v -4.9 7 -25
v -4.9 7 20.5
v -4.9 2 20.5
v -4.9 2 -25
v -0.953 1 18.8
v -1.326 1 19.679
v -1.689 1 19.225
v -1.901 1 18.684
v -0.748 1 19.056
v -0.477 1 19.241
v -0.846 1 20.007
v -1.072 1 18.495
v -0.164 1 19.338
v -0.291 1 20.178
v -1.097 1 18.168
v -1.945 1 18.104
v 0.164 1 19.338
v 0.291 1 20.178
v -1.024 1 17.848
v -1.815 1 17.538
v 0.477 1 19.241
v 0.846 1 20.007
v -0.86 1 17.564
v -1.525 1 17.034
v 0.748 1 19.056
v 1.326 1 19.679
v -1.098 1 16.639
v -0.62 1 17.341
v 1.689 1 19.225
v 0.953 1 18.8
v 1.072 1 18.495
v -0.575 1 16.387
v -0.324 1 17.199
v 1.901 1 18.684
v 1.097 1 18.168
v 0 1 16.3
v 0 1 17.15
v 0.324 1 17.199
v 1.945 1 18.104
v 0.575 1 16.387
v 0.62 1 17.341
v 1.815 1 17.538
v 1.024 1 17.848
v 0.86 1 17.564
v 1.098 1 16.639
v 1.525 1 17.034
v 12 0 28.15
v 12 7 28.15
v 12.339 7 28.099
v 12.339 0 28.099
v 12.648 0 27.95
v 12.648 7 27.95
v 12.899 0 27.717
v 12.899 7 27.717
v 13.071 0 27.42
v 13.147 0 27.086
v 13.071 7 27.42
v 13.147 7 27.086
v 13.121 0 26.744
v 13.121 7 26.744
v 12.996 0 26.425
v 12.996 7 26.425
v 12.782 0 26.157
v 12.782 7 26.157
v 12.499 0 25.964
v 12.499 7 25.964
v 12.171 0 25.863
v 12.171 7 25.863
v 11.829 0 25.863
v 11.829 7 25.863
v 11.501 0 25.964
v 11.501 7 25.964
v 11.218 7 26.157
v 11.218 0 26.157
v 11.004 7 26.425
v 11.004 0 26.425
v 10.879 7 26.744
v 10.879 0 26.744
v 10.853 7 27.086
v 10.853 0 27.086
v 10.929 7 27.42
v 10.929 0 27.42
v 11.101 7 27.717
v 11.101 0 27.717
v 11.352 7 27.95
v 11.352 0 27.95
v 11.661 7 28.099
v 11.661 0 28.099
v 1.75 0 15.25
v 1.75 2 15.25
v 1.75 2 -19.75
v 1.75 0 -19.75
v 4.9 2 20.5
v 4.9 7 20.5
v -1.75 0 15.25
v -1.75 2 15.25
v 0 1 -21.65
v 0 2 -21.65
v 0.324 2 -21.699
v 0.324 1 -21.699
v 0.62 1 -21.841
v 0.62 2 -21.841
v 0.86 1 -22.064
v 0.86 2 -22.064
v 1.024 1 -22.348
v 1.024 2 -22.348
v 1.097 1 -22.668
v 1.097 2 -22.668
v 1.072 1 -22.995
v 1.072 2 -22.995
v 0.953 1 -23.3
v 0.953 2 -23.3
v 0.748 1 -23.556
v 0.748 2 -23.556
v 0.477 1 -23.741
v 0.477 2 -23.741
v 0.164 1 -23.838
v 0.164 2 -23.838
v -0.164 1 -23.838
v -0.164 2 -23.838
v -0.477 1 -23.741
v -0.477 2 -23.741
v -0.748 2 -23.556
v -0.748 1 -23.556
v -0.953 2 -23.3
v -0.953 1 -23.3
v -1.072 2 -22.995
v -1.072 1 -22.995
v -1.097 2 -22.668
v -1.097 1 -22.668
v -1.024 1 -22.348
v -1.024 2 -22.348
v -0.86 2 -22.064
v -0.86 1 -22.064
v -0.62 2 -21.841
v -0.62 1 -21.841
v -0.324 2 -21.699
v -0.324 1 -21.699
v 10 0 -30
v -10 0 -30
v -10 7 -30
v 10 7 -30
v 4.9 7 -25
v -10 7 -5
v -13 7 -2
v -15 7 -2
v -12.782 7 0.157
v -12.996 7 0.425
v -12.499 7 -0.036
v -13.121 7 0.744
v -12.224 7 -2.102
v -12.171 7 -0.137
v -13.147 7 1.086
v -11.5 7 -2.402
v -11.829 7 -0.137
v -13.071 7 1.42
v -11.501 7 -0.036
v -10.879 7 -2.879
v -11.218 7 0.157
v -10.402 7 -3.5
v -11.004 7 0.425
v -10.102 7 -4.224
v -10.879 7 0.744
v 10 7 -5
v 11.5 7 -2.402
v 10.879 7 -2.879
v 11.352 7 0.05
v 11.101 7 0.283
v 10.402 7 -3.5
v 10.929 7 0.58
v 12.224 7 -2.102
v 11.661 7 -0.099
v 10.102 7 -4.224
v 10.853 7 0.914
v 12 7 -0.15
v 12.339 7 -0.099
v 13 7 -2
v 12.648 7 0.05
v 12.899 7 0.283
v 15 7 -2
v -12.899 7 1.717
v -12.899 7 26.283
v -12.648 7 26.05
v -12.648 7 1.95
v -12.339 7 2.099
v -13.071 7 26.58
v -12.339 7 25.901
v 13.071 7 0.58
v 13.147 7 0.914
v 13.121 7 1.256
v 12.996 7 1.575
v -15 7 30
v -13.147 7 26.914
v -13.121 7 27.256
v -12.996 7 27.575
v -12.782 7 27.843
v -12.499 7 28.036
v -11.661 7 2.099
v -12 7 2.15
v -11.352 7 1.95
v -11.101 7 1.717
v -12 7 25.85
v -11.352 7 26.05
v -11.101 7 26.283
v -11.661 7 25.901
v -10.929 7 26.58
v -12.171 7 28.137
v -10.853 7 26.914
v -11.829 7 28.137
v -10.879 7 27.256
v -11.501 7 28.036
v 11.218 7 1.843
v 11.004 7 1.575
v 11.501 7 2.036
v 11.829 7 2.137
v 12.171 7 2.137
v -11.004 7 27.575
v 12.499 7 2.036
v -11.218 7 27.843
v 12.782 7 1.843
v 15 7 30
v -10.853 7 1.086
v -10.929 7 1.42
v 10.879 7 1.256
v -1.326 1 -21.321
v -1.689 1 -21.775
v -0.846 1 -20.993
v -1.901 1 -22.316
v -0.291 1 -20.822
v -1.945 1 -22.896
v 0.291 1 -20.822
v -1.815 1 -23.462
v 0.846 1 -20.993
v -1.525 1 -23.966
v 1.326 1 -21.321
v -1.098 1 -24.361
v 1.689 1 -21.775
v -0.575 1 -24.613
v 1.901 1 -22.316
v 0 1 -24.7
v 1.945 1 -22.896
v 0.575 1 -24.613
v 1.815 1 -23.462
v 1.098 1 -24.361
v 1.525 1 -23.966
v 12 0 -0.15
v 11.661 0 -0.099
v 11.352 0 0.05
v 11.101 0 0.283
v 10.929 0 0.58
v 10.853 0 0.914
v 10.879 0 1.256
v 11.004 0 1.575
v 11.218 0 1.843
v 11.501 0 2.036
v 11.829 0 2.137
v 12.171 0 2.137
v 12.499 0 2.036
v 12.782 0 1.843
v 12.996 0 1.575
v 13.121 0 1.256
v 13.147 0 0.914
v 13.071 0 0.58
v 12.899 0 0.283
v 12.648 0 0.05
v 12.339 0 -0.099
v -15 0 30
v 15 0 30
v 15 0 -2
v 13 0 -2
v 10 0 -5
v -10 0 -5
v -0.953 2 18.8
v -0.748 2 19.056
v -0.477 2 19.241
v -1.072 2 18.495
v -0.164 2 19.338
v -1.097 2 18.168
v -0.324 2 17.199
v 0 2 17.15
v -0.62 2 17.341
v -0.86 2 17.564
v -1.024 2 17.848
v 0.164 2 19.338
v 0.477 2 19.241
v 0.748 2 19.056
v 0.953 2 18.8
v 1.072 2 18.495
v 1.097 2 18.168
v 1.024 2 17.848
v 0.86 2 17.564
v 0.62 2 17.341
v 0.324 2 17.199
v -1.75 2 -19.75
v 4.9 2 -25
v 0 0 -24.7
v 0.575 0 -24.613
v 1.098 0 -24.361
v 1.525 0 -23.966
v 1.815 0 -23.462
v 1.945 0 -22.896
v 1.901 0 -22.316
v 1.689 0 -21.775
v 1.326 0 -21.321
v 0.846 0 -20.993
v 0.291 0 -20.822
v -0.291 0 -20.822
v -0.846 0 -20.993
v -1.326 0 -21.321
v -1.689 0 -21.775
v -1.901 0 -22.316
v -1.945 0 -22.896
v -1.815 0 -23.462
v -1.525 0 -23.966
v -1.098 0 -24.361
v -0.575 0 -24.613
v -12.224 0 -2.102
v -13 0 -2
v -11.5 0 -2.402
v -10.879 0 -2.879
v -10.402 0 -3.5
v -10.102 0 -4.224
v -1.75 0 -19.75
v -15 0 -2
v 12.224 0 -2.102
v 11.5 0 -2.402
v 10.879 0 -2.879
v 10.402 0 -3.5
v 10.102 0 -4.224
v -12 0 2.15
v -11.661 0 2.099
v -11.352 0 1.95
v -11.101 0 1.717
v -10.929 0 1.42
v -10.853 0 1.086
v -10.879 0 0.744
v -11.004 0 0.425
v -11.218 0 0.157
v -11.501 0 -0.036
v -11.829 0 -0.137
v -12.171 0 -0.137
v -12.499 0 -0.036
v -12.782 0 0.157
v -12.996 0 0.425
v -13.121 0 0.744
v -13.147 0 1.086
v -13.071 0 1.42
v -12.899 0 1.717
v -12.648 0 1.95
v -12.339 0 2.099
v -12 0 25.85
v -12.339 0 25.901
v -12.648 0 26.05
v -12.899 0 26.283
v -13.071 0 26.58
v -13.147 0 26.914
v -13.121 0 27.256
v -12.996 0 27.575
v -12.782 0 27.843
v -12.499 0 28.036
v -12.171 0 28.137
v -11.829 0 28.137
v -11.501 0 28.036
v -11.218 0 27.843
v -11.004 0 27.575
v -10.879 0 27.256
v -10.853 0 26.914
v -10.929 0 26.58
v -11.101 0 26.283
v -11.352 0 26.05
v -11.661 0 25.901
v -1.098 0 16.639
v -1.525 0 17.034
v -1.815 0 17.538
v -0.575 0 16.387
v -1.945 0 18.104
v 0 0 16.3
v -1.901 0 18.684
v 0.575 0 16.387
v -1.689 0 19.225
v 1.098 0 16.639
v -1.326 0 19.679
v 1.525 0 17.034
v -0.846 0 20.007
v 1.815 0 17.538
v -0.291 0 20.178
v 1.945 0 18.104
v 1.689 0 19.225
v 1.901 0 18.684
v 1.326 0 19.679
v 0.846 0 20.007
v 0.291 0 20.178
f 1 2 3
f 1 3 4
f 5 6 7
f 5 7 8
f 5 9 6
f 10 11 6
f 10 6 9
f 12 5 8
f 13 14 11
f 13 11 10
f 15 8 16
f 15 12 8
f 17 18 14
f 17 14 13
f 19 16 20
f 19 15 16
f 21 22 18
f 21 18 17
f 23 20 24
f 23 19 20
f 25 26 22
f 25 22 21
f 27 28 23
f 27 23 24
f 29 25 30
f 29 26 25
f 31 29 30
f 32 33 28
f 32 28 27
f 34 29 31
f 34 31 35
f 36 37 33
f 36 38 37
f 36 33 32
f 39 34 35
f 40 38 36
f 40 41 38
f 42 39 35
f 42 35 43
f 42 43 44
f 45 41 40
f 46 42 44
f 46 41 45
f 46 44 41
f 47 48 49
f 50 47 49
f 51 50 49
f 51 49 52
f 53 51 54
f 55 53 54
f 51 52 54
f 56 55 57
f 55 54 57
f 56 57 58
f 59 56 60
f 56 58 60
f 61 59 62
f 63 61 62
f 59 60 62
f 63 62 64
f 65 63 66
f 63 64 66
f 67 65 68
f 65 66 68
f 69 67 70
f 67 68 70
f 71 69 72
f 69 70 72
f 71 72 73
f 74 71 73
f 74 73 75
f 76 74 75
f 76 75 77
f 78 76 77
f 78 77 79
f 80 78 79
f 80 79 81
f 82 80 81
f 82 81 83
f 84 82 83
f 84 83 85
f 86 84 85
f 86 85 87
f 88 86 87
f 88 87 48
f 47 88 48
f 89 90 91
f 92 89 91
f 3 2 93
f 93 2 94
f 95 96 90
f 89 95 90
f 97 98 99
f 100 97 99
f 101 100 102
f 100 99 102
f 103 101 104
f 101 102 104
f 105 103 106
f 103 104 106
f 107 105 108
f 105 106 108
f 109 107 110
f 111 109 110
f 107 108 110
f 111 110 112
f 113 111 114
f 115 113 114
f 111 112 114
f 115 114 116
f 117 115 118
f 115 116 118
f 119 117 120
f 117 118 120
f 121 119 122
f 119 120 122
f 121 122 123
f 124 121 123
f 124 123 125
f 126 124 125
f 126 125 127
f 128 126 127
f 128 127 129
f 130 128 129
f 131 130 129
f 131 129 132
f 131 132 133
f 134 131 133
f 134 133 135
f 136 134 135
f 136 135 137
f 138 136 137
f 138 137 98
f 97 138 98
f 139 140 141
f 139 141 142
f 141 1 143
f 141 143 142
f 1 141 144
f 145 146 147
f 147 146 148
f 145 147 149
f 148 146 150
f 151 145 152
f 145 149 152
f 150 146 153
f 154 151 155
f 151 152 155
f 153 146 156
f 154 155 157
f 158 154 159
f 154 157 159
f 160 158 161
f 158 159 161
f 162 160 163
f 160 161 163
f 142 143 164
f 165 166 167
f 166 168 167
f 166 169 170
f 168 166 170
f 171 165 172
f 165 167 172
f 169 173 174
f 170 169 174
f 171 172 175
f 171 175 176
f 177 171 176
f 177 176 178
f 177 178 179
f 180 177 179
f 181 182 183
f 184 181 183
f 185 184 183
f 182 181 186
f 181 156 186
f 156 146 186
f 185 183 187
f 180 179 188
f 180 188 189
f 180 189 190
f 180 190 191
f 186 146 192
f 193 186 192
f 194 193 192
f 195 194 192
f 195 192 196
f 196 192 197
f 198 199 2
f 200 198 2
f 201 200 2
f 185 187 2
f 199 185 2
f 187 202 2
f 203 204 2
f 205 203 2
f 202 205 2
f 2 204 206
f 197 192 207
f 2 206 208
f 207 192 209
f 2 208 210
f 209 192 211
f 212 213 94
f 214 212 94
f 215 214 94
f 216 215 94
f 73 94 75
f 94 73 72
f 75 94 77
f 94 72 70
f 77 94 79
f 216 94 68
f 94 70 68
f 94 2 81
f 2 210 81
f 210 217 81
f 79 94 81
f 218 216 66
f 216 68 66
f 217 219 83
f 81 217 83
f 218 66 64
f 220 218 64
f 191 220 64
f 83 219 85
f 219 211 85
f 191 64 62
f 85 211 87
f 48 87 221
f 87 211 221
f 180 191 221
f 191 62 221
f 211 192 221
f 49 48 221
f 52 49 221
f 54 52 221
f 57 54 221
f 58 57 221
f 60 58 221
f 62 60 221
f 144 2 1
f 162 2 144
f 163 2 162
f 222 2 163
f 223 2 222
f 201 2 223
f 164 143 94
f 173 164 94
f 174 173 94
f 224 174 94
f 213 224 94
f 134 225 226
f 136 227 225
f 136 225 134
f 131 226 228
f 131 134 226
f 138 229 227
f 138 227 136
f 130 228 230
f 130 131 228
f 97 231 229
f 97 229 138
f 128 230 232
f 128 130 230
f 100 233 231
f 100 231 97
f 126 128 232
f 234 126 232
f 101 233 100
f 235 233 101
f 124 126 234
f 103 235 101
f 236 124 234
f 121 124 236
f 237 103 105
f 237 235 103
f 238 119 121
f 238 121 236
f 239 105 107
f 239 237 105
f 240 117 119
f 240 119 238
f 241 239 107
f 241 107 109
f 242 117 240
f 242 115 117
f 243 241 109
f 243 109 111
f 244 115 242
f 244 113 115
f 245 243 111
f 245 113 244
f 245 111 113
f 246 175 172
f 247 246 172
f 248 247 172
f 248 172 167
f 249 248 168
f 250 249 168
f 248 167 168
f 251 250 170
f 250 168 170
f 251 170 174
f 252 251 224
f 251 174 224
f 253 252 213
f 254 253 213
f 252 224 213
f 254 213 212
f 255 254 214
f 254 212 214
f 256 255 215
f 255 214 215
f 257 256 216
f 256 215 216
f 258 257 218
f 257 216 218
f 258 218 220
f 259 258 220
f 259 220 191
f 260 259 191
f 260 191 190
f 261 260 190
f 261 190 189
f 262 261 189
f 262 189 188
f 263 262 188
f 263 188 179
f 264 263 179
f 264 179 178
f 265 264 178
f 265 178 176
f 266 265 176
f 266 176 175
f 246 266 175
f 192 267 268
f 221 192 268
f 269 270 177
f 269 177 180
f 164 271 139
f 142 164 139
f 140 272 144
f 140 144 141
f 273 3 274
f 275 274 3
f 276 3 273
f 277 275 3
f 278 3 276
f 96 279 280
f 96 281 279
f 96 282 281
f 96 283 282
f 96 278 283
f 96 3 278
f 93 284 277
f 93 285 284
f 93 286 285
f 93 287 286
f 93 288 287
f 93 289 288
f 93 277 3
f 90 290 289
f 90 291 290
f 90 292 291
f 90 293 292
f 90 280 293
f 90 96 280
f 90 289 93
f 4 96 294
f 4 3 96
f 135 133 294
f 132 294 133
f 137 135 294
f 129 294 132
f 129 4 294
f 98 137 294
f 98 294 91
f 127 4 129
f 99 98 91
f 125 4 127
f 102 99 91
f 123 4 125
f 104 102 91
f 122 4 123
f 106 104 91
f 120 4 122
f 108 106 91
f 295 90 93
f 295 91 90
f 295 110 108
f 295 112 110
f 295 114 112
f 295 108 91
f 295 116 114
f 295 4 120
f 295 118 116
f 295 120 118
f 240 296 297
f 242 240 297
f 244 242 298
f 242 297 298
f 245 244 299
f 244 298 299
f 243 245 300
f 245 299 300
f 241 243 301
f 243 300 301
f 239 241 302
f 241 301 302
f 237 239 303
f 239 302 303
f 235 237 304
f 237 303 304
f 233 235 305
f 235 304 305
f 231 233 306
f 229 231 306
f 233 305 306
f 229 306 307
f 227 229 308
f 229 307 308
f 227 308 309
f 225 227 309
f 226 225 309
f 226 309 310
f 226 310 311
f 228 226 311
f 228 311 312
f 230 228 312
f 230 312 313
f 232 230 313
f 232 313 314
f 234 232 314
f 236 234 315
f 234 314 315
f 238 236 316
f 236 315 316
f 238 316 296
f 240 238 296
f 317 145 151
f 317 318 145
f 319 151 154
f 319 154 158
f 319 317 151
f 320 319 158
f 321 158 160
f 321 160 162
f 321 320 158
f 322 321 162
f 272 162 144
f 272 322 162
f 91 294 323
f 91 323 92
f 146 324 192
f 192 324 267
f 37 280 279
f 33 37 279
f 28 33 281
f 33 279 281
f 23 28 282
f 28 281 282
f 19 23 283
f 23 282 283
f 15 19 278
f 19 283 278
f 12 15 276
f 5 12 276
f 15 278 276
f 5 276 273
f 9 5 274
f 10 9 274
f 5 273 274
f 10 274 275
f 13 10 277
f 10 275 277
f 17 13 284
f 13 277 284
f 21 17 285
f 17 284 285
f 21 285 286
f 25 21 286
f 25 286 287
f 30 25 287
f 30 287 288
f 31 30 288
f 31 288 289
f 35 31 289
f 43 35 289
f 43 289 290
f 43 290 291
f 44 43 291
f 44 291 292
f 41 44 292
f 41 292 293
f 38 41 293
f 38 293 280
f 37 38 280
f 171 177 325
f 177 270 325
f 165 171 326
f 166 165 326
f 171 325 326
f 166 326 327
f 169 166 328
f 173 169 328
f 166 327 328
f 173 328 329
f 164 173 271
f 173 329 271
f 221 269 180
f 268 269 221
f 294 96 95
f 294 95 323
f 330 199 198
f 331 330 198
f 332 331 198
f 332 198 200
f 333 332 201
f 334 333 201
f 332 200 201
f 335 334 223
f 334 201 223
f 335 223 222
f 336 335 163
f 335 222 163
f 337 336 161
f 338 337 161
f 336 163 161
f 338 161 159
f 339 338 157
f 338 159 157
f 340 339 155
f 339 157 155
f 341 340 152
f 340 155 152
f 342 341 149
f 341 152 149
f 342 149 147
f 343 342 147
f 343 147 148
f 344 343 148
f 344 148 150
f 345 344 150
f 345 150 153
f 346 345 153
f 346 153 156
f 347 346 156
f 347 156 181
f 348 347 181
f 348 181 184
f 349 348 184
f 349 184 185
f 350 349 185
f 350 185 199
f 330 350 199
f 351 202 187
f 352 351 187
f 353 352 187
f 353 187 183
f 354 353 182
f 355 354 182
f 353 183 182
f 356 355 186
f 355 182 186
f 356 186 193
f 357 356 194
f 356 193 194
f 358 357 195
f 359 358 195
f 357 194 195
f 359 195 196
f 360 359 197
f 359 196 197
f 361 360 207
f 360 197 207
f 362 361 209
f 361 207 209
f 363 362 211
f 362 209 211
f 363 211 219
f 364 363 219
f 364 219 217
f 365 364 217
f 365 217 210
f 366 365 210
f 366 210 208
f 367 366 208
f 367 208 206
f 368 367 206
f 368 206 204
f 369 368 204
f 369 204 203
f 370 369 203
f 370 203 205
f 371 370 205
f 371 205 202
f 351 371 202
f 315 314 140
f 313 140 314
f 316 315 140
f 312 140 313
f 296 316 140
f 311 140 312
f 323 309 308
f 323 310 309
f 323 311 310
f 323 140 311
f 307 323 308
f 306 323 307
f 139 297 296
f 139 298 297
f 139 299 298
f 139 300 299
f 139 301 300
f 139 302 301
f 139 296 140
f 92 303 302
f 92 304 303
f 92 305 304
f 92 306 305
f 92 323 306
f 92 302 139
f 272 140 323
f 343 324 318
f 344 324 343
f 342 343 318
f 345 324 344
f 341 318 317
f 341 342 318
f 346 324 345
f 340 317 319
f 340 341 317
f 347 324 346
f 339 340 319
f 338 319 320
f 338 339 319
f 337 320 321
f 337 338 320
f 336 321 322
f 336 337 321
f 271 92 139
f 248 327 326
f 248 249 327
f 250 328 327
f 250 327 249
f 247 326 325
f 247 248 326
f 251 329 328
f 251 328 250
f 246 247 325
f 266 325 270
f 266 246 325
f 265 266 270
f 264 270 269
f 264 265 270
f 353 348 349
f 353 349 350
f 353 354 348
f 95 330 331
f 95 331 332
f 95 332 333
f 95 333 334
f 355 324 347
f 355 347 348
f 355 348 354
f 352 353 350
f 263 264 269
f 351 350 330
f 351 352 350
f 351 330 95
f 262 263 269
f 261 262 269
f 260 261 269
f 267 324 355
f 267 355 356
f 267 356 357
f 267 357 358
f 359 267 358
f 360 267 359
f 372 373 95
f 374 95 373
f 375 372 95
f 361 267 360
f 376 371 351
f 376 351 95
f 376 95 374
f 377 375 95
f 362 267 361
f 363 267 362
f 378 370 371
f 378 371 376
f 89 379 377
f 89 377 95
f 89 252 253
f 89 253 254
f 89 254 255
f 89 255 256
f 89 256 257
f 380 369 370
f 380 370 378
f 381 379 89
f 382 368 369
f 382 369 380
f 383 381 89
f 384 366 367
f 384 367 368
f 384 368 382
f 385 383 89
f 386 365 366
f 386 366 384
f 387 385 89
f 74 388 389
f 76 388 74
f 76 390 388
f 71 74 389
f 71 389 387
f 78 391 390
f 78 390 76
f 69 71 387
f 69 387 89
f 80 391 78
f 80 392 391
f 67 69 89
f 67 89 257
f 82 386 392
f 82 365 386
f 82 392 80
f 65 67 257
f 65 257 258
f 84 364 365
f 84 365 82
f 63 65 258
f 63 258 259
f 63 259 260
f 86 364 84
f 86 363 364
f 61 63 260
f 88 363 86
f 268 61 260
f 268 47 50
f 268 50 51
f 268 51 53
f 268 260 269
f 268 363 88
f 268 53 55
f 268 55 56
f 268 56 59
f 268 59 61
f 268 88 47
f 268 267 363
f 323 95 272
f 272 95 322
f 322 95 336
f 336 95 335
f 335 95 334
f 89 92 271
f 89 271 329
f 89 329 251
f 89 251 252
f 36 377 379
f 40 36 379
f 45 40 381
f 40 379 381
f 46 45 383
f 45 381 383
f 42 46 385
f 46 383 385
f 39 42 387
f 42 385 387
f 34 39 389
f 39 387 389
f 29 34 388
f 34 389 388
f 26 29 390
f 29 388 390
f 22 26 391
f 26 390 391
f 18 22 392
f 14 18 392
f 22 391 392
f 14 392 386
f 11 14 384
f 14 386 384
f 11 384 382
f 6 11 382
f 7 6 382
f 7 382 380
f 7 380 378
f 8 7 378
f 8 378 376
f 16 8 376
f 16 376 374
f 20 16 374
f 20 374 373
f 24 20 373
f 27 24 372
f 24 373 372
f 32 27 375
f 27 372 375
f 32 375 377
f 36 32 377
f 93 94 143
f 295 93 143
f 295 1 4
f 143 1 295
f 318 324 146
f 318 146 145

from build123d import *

# Parameters (mm, degrees)
SKETCH_1_W          = 20
SKETCH_1_H          = 60
EXTRUDE_1_DEPTH     = 7
SKETCH_4_W          = 30
SKETCH_4_H          = 32
EXTRUDE_2_DEPTH     = 7
SKETCH_3_W          = 9.8
SKETCH_3_H          = 45.5
CUT_EXTRUDE_1_DEPTH = 5
SKETCH_5_W          = 3.5
SKETCH_5_H          = 35
CUT_EXTRUDE_2_DEPTH = 34.911649916
SKETCH_6_R          = 1.1
CUT_EXTRUDE_3_DEPTH = 34.911649916
SKETCH_7_R          = 1.15
CUT_EXTRUDE_4_DEPTH = 35.263683398
FILLET_1_R          = 3
SKETCH_8_R          = 1.95
CUT_EXTRUDE_5_DEPTH = 1


with BuildPart() as part:
    # 草图1 → 凸台-拉伸1 (new body)
    with BuildSketch(Plane(origin=(0, 0, 0), x_dir=(1, 0, 0), z_dir=(0, 1, 0))):
        Rectangle(SKETCH_1_W, SKETCH_1_H)
    extrude(amount=EXTRUDE_1_DEPTH)

    # 草图4 → 凸台-拉伸2 (add)
    with BuildSketch(Plane.XZ):
        with Locations((0, 14)):
            Rectangle(SKETCH_4_W, SKETCH_4_H)
    extrude(amount=-EXTRUDE_2_DEPTH)

    # 草图3 → 切除-拉伸1 (cut)
    with BuildSketch(Plane(origin=(0, 7, 0), x_dir=(1, 0, 0), z_dir=(0, 1, 0))):
        with Locations((0, 2.25)):
            Rectangle(SKETCH_3_W, SKETCH_3_H)
    extrude(amount=-CUT_EXTRUDE_1_DEPTH, mode=Mode.SUBTRACT)

    # 草图5 → 切除-拉伸2 (cut, through all)
    with BuildSketch(Plane(origin=(0, 2, 0), x_dir=(1, 0, 0), z_dir=(0, 1, 0))):
        with Locations((0, 2.25)):
            Rectangle(SKETCH_5_W, SKETCH_5_H)
    extrude(amount=-CUT_EXTRUDE_2_DEPTH, mode=Mode.SUBTRACT)

    # 草图6 → 切除-拉伸3 (cut, through all)
    with BuildSketch(Plane(origin=(0, 2, 0), x_dir=(1, 0, 0), z_dir=(0, 1, 0))):
        with Locations(Location((0, 22.75, 0), (0, 0, 270))):
            Circle(SKETCH_6_R)
        with Locations(Location((0, -18.25, 0), (0, 0, 90))):
            Circle(SKETCH_6_R)
    extrude(amount=-CUT_EXTRUDE_3_DEPTH, mode=Mode.SUBTRACT)

    # 草图7 → 切除-拉伸4 (cut, through all)
    with BuildSketch(Plane(origin=(0, 7, 0), x_dir=(1, 0, 0), z_dir=(0, 1, 0))):
        with Locations(Location((-12, -1, 0), (0, 0, 270))):
            Circle(SKETCH_7_R)
        with Locations(Location((12, -1, 0), (0, 0, 90))):
            Circle(SKETCH_7_R)
        with Locations(Location((12, -27, 0), (0, 0, 270))):
            Circle(SKETCH_7_R)
        with Locations(Location((-12, -27, 0), (0, 0, 90))):
            Circle(SKETCH_7_R)
    extrude(amount=-CUT_EXTRUDE_4_DEPTH, mode=Mode.SUBTRACT)

    # 圆角1
    fillet_1_edges = [part.edges().sort_by_distance(p)[0] for p in [
        (10, 3.5, -2),
        (-10, 3.5, -2),
    ]]
    fillet(fillet_1_edges, radius=FILLET_1_R)

    # 草图8 → 切除-拉伸5 (cut)
    with BuildSketch(Plane.XZ):
        with Locations(Location((0, 18.25, 0), (0, 0, 270))):
            Circle(SKETCH_8_R)
        with Locations(Location((0, -22.75, 0), (0, 0, 270))):
            Circle(SKETCH_8_R)
    extrude(amount=-CUT_EXTRUDE_5_DEPTH, mode=Mode.SUBTRACT)


solid = part.part
